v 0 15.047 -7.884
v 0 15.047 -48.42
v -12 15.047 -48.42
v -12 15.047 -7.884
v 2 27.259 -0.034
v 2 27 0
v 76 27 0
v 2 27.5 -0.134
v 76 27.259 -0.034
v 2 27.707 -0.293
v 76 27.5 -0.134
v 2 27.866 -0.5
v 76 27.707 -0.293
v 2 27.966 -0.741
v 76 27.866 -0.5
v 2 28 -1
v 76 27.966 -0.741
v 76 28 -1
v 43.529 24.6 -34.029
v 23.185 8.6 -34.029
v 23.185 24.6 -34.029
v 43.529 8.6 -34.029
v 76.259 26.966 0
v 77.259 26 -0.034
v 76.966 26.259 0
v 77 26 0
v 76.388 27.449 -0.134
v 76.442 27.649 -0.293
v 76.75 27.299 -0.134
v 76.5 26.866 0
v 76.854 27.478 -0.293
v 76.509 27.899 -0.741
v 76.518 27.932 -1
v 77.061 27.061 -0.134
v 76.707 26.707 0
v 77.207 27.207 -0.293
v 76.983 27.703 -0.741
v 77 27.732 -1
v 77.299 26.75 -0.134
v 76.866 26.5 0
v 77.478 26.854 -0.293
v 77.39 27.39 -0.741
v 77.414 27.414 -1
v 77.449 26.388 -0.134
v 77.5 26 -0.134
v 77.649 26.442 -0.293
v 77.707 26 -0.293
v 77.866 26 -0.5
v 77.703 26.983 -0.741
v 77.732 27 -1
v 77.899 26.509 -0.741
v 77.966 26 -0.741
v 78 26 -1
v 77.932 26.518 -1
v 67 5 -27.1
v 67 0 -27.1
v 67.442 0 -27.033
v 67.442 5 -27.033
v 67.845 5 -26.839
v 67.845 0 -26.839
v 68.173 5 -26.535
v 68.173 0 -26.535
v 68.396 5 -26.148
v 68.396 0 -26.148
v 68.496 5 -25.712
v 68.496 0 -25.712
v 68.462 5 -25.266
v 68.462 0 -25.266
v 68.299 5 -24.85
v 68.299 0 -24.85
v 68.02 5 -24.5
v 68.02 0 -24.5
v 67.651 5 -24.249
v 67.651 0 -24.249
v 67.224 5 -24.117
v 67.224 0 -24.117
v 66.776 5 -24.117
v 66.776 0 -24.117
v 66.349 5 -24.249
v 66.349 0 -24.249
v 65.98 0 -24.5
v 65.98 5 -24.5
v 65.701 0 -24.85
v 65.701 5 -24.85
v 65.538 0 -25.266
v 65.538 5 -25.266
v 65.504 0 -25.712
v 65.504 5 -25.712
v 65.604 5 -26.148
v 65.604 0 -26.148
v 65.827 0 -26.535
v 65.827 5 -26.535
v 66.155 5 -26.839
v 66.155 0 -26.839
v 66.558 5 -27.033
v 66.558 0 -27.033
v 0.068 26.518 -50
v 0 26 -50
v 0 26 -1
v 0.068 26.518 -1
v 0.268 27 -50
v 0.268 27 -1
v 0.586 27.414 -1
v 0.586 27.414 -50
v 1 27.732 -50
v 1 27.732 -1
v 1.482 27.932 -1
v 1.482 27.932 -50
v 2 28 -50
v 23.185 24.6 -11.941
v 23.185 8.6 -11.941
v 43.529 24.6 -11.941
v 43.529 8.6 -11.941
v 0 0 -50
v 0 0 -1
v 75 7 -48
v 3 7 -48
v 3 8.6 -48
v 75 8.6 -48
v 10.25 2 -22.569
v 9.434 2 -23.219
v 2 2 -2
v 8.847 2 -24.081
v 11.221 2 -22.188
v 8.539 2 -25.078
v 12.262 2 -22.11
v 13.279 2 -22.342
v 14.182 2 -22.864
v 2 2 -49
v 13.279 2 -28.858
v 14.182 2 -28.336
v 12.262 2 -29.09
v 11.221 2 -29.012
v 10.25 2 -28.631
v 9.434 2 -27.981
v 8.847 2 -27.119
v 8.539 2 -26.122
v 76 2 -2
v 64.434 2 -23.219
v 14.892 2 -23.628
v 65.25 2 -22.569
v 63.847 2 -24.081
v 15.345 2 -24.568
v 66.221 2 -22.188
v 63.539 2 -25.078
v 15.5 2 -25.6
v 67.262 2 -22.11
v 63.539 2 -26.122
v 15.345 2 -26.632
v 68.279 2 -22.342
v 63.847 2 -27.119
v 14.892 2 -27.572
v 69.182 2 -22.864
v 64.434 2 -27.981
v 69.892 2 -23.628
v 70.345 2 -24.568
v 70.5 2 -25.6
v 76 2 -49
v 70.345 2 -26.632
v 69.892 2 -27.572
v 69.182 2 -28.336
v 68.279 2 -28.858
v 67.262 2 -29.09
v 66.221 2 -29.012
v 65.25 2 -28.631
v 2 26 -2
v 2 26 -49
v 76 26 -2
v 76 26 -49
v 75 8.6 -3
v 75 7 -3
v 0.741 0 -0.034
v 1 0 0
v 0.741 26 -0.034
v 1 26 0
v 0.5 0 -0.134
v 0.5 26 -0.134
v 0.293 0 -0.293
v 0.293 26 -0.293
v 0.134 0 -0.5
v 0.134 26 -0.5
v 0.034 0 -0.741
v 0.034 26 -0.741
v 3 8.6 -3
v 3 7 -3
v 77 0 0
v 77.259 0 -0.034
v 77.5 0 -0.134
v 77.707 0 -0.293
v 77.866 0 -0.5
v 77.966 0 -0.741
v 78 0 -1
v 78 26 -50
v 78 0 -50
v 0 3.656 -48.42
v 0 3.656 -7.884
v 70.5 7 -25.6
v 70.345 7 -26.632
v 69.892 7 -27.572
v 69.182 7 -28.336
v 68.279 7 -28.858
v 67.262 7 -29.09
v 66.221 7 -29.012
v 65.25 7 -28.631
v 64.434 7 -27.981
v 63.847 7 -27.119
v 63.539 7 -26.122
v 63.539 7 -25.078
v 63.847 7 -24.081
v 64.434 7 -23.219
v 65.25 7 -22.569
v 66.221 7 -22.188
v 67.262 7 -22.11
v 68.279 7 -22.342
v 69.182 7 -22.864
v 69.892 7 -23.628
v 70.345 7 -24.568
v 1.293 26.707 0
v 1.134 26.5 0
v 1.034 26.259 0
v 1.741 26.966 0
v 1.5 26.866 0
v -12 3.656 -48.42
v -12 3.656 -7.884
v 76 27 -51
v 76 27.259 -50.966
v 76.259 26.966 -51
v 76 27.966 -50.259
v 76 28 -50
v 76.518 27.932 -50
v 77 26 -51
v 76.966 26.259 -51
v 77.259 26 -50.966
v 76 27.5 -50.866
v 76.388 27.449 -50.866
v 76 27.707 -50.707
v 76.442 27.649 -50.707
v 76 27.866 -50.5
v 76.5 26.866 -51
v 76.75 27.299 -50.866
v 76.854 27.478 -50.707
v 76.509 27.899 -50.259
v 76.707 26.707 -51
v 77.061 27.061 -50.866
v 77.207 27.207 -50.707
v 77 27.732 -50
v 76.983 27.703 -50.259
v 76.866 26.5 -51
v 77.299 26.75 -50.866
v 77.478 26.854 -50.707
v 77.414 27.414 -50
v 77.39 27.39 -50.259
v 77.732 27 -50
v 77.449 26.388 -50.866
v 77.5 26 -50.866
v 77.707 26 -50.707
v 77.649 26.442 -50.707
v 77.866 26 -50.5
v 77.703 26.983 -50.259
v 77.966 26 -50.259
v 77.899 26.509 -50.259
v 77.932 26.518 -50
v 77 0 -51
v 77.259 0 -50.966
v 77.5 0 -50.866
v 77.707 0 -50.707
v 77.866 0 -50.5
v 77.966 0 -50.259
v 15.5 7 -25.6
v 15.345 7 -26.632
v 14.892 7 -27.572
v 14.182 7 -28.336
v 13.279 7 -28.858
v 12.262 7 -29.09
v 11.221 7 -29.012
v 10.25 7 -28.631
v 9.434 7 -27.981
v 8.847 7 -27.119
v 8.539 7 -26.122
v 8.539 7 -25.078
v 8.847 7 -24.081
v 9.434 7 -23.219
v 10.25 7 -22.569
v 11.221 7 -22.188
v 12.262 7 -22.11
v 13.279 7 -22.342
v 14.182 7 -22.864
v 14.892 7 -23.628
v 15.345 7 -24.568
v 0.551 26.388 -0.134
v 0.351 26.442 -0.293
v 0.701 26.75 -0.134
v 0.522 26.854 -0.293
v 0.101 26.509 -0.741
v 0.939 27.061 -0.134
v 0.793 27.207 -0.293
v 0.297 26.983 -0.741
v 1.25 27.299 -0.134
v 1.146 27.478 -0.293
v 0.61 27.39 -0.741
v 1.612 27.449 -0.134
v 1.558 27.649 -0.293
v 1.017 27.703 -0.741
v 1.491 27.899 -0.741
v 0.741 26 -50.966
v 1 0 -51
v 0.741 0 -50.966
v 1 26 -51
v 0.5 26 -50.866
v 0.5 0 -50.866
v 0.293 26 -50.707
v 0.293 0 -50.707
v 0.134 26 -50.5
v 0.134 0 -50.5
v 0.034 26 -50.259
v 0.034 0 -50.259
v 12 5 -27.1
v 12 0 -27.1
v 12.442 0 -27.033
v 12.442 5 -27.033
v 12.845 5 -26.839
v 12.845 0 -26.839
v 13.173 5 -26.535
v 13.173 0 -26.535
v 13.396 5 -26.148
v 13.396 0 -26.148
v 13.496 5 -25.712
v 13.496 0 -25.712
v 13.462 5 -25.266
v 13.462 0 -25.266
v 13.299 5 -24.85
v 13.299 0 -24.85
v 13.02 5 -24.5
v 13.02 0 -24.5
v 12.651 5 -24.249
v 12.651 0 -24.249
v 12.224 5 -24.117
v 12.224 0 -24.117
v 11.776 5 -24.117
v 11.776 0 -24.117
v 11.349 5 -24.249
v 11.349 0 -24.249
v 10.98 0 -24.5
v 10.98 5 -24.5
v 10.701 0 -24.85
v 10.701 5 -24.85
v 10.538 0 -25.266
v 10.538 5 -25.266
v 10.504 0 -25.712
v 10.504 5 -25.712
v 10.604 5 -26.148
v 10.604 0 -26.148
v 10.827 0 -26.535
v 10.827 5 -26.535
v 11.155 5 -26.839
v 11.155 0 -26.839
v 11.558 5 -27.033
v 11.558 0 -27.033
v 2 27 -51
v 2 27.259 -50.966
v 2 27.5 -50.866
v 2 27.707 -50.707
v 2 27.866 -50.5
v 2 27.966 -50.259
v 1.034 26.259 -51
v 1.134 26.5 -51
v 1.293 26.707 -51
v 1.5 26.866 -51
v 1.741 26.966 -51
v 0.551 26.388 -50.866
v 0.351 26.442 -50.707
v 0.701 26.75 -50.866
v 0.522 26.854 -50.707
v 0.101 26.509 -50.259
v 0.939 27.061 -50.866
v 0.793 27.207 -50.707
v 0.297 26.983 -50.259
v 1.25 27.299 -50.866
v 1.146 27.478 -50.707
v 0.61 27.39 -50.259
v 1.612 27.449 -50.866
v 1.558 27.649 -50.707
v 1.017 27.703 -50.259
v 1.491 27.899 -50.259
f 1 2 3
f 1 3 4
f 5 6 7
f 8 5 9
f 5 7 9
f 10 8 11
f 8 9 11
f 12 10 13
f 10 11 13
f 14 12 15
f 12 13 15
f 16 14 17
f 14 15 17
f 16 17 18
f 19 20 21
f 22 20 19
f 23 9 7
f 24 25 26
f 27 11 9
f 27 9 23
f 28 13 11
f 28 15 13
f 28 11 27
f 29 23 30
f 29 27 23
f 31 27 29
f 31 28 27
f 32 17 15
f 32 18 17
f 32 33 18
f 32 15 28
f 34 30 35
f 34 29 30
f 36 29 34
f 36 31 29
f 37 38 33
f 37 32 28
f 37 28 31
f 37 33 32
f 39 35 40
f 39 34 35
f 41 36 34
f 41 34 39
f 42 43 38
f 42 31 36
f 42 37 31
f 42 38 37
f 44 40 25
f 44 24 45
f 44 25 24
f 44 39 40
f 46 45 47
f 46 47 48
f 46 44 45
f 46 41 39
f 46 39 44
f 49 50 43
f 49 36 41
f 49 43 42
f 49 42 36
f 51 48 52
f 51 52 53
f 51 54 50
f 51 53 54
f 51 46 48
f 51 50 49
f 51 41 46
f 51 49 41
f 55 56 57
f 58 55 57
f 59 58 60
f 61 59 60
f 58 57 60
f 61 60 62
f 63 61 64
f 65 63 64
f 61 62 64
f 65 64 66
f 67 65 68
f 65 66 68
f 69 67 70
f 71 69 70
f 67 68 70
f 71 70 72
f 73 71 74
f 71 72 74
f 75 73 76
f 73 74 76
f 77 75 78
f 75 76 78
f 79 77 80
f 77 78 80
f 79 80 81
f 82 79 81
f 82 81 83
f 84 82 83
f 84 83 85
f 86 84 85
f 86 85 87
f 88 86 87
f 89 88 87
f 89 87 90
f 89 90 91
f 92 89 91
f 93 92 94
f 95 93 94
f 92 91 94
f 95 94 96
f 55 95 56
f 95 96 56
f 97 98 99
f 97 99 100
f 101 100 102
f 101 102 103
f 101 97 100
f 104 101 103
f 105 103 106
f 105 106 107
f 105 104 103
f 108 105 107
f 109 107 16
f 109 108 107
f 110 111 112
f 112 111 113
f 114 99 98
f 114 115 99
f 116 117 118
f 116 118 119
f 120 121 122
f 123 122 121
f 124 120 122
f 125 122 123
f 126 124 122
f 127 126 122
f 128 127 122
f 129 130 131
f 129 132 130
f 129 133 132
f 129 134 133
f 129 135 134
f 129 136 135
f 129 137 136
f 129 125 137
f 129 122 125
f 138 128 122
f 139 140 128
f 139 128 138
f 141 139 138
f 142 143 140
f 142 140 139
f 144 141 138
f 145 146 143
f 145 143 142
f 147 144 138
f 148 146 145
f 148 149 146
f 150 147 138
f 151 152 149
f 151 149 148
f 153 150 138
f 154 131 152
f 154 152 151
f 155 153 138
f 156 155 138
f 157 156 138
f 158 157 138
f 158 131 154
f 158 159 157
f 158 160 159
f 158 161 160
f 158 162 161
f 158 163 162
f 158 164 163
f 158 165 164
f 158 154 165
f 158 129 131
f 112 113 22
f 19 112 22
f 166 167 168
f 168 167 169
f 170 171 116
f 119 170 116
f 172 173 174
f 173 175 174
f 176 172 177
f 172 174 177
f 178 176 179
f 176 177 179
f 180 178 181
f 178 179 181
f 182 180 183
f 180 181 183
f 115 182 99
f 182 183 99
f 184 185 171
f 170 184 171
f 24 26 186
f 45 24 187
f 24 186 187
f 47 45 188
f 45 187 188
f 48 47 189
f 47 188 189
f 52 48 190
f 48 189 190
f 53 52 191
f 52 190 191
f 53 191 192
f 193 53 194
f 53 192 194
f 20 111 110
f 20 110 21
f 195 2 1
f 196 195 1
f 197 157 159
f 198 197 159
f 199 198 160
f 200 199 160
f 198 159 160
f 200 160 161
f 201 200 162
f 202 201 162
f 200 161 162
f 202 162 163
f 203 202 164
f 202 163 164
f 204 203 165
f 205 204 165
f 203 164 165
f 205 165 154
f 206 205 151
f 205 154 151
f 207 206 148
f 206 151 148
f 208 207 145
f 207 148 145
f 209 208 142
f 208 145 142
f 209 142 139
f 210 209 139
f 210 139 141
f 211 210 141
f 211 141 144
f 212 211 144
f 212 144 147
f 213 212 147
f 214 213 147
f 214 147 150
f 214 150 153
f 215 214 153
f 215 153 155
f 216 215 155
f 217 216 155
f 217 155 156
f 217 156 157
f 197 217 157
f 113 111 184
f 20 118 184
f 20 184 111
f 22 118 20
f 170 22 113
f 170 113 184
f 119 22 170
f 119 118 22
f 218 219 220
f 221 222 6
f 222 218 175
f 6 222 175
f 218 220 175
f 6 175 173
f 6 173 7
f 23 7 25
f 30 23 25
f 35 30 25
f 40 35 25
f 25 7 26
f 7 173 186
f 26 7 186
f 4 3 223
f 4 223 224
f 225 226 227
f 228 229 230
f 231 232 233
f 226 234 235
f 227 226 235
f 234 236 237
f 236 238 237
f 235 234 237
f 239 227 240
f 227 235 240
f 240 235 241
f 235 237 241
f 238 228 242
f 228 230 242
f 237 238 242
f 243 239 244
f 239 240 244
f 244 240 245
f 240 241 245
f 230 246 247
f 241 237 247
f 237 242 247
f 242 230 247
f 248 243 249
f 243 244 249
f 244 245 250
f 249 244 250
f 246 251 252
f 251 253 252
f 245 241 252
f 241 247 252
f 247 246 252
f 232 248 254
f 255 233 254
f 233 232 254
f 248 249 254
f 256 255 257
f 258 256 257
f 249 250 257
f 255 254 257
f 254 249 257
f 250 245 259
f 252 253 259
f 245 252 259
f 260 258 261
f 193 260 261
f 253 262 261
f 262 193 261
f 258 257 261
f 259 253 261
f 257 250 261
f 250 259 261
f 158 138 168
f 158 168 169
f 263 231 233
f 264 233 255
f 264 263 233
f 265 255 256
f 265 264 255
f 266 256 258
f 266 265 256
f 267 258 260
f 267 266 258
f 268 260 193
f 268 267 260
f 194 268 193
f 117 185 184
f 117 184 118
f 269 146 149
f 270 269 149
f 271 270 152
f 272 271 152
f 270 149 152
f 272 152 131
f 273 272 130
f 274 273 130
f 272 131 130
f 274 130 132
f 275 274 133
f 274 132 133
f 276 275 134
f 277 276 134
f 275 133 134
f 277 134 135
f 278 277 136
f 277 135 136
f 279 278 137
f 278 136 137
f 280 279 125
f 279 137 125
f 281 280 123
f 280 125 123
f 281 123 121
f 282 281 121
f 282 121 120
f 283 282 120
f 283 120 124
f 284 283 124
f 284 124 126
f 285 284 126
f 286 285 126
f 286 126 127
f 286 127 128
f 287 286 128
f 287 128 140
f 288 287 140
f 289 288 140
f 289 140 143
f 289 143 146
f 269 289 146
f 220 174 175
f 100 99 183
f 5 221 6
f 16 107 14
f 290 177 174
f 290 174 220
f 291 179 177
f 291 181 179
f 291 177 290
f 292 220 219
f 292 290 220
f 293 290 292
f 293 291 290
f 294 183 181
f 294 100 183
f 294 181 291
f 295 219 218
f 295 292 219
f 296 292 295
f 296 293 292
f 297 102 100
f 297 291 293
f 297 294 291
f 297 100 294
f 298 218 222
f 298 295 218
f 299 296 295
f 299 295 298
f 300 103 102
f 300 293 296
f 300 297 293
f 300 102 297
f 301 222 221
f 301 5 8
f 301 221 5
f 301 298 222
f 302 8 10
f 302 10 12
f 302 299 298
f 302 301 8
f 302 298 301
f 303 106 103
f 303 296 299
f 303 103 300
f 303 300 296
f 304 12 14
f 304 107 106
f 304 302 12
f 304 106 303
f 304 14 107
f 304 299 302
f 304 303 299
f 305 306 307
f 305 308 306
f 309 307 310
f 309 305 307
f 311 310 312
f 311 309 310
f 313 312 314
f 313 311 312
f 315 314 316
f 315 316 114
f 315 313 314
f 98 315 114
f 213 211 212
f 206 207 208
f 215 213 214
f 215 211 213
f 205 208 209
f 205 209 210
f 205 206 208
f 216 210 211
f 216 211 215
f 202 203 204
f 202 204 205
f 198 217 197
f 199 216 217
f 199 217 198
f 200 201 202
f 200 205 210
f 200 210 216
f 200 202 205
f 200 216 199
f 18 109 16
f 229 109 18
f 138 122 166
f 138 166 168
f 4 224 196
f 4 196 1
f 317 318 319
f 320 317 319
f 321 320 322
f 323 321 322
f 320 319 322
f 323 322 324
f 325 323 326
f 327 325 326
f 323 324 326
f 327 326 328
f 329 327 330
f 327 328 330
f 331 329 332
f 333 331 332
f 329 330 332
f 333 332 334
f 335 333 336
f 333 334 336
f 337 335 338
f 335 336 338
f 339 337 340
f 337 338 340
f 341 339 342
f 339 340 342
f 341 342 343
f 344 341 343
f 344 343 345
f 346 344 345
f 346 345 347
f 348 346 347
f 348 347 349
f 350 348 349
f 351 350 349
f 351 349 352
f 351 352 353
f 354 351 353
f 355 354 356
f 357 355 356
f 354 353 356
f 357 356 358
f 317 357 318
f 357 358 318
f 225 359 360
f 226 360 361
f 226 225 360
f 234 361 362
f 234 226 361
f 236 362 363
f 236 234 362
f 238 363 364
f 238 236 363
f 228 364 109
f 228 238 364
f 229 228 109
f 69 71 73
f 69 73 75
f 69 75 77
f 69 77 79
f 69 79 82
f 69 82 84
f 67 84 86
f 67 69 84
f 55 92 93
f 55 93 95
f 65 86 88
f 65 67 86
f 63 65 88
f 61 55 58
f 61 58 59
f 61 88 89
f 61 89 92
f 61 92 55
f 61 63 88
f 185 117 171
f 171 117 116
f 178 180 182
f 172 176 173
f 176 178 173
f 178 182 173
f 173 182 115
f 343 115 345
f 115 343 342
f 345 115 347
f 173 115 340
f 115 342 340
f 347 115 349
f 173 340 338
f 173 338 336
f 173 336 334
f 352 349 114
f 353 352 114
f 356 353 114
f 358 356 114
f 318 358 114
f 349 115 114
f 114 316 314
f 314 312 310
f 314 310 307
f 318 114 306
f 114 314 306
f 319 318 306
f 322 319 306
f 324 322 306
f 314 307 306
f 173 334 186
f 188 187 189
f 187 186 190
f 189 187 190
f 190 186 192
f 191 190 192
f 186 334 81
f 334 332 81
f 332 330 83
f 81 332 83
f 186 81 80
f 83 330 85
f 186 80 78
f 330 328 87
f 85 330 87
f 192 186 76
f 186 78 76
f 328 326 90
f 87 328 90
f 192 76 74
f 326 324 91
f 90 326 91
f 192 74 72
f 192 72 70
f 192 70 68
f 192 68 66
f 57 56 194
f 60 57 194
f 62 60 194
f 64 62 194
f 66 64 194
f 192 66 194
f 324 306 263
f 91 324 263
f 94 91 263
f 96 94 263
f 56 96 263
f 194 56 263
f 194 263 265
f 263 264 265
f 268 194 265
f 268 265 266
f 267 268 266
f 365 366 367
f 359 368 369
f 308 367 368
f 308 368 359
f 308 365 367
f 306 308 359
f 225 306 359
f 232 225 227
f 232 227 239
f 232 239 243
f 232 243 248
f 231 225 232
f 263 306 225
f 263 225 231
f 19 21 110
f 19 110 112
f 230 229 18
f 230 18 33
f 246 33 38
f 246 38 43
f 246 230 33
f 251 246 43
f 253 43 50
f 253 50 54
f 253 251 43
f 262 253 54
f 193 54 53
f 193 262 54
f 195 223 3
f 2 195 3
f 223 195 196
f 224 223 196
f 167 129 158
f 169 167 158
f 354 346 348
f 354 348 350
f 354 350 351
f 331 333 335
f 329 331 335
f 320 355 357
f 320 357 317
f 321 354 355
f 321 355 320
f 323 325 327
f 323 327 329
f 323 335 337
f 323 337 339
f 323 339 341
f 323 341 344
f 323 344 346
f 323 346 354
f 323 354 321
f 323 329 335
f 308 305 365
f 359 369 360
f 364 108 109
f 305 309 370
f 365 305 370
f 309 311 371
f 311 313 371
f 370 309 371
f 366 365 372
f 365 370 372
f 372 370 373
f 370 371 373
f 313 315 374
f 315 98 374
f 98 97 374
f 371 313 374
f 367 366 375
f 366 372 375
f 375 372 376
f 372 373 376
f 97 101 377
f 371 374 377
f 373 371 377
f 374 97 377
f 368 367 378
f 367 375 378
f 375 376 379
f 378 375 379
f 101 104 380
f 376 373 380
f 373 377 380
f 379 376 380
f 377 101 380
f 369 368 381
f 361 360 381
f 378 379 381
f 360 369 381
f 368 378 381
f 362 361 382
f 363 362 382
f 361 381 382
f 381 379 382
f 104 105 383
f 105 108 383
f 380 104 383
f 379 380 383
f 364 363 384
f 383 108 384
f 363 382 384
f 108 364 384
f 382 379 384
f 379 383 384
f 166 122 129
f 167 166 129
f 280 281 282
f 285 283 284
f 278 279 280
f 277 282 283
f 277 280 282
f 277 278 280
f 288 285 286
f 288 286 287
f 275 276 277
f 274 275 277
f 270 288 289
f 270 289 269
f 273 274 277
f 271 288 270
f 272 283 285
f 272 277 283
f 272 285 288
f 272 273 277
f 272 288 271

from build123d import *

# Parameters (mm, degrees)
SKETCH1_W           = 78
SKETCH1_H           = 51
BOSS_EXTRUDE1_DEPTH = 28
SKETCH2_R           = 1.5
CUT_EXTRUDE1_DEPTH  = 5
SKETCH3_W           = 40.53601249
SKETCH3_H           = 11.390631449
BOSS_EXTRUDE2_DEPTH = 12
FILLET1_R           = 2
FILLET2_R           = 1
SHELL3_START        = 2
SHELL3_OUTLINE_W    = 74
SHELL3_OUTLINE_H    = 47
SHELL3_OUTLINE_R    = 3.5
SHELL3_DEPTH        = 24
SHELL3_START_2      = 7
SHELL3_2_OUTLINE_R  = 3.5
SHELL3_2_DEPTH      = 19
SKETCH5_W           = 72
SKETCH5_H           = 45
BOSS_EXTRUDE3_DEPTH = 1.6
SKETCH6_W           = 20.344550397
SKETCH6_H           = 22.088359597
BOSS_EXTRUDE4_DEPTH = 16


# Read off the part's stored shape, not the designer's step: Shell3
with BuildPart() as part:
    # Sketch1 → Boss-Extrude1 (new body)
    with BuildSketch(Plane(origin=(0, 0, 0), x_dir=(1, 0, 0), z_dir=(0, 1, 0))):
        with Locations((39, 25.5)):
            Rectangle(SKETCH1_W, SKETCH1_H)
    extrude(amount=BOSS_EXTRUDE1_DEPTH)

    # Sketch2 → Cut-Extrude1 (cut)
    with BuildSketch(Plane.XZ):
        with Locations(Location((67, -25.6, 0), (0, 0, 270))):
            Circle(SKETCH2_R)
        with Locations(Location((12, -25.6, 0), (0, 0, 270))):
            Circle(SKETCH2_R)
    extrude(amount=-CUT_EXTRUDE1_DEPTH, mode=Mode.SUBTRACT)

    # Fillet1
    fillet1_edges = [part.edges().sort_by_distance(p)[0] for p in [
        (78, 28, -25.5),
        (0, 28, -25.5),
    ]]
    fillet(fillet1_edges, radius=FILLET1_R)

    # Fillet2
    fillet2_edges = [part.edges().sort_by_distance(p)[0] for p in [
        (39, 28, 0),
        (39, 28, -51),
        (0, 13, -51),
        (78, 13, -51),
        (0.585786438, 27.414213562, -51),
        (77.414213562, 27.414213562, -51),
        (78, 13, 0),
        (0, 13, 0),
        (0.585786438, 27.414213562, 0),
        (77.414213562, 27.414213562, 0),
    ]]
    fillet(fillet2_edges, radius=FILLET2_R)

    # Shell3 outline → Shell3 (cut)
    with BuildSketch(Plane(origin=(0, 0, 0), x_dir=(1, 0, 0), z_dir=(0, 1, 0)).offset(SHELL3_START)):
        with Locations((39, 25.5)):
            Rectangle(SHELL3_OUTLINE_W, SHELL3_OUTLINE_H)
        with Locations((12, 25.6)):
            Circle(SHELL3_OUTLINE_R, mode=Mode.SUBTRACT)
        with Locations((67, 25.6)):
            Circle(SHELL3_OUTLINE_R, mode=Mode.SUBTRACT)
    extrude(amount=SHELL3_DEPTH, mode=Mode.SUBTRACT)

    # Shell3 2 outline → Shell3 2 (cut)
    with BuildSketch(Plane(origin=(0, 0, 0), x_dir=(1, 0, 0), z_dir=(0, 1, 0)).offset(SHELL3_START_2)):
        with Locations((12, 25.6)):
            Circle(SHELL3_2_OUTLINE_R)
        with Locations((67, 25.6)):
            Circle(SHELL3_2_OUTLINE_R)
    extrude(amount=SHELL3_2_DEPTH, mode=Mode.SUBTRACT)


with BuildPart() as body_2:
    # Sketch3 → Boss-Extrude2 (new body)
    with BuildSketch(Plane.ZY):
        with Locations((-28.152164423, 9.351775934)):
            Rectangle(SKETCH3_W, SKETCH3_H)
    extrude(amount=BOSS_EXTRUDE2_DEPTH)


with BuildPart() as body_3:
    # Sketch5 → Boss-Extrude3 (new body)
    with BuildSketch(Plane(origin=(0, 7, 0), x_dir=(1, 0, 0), z_dir=(0, 1, 0))):
        with Locations((39, 25.5)):
            Rectangle(SKETCH5_W, SKETCH5_H)
    extrude(amount=BOSS_EXTRUDE3_DEPTH)

    # Sketch6 → Boss-Extrude4 (add)
    with BuildSketch(Plane(origin=(0, 8.6, 0), x_dir=(1, 0, 0), z_dir=(0, 1, 0))):
        with Locations((33.357185466, 22.98504657)):
            Rectangle(SKETCH6_W, SKETCH6_H)
    extrude(amount=BOSS_EXTRUDE4_DEPTH)


solid = Compound([part.part, body_2.part, body_3.part])
